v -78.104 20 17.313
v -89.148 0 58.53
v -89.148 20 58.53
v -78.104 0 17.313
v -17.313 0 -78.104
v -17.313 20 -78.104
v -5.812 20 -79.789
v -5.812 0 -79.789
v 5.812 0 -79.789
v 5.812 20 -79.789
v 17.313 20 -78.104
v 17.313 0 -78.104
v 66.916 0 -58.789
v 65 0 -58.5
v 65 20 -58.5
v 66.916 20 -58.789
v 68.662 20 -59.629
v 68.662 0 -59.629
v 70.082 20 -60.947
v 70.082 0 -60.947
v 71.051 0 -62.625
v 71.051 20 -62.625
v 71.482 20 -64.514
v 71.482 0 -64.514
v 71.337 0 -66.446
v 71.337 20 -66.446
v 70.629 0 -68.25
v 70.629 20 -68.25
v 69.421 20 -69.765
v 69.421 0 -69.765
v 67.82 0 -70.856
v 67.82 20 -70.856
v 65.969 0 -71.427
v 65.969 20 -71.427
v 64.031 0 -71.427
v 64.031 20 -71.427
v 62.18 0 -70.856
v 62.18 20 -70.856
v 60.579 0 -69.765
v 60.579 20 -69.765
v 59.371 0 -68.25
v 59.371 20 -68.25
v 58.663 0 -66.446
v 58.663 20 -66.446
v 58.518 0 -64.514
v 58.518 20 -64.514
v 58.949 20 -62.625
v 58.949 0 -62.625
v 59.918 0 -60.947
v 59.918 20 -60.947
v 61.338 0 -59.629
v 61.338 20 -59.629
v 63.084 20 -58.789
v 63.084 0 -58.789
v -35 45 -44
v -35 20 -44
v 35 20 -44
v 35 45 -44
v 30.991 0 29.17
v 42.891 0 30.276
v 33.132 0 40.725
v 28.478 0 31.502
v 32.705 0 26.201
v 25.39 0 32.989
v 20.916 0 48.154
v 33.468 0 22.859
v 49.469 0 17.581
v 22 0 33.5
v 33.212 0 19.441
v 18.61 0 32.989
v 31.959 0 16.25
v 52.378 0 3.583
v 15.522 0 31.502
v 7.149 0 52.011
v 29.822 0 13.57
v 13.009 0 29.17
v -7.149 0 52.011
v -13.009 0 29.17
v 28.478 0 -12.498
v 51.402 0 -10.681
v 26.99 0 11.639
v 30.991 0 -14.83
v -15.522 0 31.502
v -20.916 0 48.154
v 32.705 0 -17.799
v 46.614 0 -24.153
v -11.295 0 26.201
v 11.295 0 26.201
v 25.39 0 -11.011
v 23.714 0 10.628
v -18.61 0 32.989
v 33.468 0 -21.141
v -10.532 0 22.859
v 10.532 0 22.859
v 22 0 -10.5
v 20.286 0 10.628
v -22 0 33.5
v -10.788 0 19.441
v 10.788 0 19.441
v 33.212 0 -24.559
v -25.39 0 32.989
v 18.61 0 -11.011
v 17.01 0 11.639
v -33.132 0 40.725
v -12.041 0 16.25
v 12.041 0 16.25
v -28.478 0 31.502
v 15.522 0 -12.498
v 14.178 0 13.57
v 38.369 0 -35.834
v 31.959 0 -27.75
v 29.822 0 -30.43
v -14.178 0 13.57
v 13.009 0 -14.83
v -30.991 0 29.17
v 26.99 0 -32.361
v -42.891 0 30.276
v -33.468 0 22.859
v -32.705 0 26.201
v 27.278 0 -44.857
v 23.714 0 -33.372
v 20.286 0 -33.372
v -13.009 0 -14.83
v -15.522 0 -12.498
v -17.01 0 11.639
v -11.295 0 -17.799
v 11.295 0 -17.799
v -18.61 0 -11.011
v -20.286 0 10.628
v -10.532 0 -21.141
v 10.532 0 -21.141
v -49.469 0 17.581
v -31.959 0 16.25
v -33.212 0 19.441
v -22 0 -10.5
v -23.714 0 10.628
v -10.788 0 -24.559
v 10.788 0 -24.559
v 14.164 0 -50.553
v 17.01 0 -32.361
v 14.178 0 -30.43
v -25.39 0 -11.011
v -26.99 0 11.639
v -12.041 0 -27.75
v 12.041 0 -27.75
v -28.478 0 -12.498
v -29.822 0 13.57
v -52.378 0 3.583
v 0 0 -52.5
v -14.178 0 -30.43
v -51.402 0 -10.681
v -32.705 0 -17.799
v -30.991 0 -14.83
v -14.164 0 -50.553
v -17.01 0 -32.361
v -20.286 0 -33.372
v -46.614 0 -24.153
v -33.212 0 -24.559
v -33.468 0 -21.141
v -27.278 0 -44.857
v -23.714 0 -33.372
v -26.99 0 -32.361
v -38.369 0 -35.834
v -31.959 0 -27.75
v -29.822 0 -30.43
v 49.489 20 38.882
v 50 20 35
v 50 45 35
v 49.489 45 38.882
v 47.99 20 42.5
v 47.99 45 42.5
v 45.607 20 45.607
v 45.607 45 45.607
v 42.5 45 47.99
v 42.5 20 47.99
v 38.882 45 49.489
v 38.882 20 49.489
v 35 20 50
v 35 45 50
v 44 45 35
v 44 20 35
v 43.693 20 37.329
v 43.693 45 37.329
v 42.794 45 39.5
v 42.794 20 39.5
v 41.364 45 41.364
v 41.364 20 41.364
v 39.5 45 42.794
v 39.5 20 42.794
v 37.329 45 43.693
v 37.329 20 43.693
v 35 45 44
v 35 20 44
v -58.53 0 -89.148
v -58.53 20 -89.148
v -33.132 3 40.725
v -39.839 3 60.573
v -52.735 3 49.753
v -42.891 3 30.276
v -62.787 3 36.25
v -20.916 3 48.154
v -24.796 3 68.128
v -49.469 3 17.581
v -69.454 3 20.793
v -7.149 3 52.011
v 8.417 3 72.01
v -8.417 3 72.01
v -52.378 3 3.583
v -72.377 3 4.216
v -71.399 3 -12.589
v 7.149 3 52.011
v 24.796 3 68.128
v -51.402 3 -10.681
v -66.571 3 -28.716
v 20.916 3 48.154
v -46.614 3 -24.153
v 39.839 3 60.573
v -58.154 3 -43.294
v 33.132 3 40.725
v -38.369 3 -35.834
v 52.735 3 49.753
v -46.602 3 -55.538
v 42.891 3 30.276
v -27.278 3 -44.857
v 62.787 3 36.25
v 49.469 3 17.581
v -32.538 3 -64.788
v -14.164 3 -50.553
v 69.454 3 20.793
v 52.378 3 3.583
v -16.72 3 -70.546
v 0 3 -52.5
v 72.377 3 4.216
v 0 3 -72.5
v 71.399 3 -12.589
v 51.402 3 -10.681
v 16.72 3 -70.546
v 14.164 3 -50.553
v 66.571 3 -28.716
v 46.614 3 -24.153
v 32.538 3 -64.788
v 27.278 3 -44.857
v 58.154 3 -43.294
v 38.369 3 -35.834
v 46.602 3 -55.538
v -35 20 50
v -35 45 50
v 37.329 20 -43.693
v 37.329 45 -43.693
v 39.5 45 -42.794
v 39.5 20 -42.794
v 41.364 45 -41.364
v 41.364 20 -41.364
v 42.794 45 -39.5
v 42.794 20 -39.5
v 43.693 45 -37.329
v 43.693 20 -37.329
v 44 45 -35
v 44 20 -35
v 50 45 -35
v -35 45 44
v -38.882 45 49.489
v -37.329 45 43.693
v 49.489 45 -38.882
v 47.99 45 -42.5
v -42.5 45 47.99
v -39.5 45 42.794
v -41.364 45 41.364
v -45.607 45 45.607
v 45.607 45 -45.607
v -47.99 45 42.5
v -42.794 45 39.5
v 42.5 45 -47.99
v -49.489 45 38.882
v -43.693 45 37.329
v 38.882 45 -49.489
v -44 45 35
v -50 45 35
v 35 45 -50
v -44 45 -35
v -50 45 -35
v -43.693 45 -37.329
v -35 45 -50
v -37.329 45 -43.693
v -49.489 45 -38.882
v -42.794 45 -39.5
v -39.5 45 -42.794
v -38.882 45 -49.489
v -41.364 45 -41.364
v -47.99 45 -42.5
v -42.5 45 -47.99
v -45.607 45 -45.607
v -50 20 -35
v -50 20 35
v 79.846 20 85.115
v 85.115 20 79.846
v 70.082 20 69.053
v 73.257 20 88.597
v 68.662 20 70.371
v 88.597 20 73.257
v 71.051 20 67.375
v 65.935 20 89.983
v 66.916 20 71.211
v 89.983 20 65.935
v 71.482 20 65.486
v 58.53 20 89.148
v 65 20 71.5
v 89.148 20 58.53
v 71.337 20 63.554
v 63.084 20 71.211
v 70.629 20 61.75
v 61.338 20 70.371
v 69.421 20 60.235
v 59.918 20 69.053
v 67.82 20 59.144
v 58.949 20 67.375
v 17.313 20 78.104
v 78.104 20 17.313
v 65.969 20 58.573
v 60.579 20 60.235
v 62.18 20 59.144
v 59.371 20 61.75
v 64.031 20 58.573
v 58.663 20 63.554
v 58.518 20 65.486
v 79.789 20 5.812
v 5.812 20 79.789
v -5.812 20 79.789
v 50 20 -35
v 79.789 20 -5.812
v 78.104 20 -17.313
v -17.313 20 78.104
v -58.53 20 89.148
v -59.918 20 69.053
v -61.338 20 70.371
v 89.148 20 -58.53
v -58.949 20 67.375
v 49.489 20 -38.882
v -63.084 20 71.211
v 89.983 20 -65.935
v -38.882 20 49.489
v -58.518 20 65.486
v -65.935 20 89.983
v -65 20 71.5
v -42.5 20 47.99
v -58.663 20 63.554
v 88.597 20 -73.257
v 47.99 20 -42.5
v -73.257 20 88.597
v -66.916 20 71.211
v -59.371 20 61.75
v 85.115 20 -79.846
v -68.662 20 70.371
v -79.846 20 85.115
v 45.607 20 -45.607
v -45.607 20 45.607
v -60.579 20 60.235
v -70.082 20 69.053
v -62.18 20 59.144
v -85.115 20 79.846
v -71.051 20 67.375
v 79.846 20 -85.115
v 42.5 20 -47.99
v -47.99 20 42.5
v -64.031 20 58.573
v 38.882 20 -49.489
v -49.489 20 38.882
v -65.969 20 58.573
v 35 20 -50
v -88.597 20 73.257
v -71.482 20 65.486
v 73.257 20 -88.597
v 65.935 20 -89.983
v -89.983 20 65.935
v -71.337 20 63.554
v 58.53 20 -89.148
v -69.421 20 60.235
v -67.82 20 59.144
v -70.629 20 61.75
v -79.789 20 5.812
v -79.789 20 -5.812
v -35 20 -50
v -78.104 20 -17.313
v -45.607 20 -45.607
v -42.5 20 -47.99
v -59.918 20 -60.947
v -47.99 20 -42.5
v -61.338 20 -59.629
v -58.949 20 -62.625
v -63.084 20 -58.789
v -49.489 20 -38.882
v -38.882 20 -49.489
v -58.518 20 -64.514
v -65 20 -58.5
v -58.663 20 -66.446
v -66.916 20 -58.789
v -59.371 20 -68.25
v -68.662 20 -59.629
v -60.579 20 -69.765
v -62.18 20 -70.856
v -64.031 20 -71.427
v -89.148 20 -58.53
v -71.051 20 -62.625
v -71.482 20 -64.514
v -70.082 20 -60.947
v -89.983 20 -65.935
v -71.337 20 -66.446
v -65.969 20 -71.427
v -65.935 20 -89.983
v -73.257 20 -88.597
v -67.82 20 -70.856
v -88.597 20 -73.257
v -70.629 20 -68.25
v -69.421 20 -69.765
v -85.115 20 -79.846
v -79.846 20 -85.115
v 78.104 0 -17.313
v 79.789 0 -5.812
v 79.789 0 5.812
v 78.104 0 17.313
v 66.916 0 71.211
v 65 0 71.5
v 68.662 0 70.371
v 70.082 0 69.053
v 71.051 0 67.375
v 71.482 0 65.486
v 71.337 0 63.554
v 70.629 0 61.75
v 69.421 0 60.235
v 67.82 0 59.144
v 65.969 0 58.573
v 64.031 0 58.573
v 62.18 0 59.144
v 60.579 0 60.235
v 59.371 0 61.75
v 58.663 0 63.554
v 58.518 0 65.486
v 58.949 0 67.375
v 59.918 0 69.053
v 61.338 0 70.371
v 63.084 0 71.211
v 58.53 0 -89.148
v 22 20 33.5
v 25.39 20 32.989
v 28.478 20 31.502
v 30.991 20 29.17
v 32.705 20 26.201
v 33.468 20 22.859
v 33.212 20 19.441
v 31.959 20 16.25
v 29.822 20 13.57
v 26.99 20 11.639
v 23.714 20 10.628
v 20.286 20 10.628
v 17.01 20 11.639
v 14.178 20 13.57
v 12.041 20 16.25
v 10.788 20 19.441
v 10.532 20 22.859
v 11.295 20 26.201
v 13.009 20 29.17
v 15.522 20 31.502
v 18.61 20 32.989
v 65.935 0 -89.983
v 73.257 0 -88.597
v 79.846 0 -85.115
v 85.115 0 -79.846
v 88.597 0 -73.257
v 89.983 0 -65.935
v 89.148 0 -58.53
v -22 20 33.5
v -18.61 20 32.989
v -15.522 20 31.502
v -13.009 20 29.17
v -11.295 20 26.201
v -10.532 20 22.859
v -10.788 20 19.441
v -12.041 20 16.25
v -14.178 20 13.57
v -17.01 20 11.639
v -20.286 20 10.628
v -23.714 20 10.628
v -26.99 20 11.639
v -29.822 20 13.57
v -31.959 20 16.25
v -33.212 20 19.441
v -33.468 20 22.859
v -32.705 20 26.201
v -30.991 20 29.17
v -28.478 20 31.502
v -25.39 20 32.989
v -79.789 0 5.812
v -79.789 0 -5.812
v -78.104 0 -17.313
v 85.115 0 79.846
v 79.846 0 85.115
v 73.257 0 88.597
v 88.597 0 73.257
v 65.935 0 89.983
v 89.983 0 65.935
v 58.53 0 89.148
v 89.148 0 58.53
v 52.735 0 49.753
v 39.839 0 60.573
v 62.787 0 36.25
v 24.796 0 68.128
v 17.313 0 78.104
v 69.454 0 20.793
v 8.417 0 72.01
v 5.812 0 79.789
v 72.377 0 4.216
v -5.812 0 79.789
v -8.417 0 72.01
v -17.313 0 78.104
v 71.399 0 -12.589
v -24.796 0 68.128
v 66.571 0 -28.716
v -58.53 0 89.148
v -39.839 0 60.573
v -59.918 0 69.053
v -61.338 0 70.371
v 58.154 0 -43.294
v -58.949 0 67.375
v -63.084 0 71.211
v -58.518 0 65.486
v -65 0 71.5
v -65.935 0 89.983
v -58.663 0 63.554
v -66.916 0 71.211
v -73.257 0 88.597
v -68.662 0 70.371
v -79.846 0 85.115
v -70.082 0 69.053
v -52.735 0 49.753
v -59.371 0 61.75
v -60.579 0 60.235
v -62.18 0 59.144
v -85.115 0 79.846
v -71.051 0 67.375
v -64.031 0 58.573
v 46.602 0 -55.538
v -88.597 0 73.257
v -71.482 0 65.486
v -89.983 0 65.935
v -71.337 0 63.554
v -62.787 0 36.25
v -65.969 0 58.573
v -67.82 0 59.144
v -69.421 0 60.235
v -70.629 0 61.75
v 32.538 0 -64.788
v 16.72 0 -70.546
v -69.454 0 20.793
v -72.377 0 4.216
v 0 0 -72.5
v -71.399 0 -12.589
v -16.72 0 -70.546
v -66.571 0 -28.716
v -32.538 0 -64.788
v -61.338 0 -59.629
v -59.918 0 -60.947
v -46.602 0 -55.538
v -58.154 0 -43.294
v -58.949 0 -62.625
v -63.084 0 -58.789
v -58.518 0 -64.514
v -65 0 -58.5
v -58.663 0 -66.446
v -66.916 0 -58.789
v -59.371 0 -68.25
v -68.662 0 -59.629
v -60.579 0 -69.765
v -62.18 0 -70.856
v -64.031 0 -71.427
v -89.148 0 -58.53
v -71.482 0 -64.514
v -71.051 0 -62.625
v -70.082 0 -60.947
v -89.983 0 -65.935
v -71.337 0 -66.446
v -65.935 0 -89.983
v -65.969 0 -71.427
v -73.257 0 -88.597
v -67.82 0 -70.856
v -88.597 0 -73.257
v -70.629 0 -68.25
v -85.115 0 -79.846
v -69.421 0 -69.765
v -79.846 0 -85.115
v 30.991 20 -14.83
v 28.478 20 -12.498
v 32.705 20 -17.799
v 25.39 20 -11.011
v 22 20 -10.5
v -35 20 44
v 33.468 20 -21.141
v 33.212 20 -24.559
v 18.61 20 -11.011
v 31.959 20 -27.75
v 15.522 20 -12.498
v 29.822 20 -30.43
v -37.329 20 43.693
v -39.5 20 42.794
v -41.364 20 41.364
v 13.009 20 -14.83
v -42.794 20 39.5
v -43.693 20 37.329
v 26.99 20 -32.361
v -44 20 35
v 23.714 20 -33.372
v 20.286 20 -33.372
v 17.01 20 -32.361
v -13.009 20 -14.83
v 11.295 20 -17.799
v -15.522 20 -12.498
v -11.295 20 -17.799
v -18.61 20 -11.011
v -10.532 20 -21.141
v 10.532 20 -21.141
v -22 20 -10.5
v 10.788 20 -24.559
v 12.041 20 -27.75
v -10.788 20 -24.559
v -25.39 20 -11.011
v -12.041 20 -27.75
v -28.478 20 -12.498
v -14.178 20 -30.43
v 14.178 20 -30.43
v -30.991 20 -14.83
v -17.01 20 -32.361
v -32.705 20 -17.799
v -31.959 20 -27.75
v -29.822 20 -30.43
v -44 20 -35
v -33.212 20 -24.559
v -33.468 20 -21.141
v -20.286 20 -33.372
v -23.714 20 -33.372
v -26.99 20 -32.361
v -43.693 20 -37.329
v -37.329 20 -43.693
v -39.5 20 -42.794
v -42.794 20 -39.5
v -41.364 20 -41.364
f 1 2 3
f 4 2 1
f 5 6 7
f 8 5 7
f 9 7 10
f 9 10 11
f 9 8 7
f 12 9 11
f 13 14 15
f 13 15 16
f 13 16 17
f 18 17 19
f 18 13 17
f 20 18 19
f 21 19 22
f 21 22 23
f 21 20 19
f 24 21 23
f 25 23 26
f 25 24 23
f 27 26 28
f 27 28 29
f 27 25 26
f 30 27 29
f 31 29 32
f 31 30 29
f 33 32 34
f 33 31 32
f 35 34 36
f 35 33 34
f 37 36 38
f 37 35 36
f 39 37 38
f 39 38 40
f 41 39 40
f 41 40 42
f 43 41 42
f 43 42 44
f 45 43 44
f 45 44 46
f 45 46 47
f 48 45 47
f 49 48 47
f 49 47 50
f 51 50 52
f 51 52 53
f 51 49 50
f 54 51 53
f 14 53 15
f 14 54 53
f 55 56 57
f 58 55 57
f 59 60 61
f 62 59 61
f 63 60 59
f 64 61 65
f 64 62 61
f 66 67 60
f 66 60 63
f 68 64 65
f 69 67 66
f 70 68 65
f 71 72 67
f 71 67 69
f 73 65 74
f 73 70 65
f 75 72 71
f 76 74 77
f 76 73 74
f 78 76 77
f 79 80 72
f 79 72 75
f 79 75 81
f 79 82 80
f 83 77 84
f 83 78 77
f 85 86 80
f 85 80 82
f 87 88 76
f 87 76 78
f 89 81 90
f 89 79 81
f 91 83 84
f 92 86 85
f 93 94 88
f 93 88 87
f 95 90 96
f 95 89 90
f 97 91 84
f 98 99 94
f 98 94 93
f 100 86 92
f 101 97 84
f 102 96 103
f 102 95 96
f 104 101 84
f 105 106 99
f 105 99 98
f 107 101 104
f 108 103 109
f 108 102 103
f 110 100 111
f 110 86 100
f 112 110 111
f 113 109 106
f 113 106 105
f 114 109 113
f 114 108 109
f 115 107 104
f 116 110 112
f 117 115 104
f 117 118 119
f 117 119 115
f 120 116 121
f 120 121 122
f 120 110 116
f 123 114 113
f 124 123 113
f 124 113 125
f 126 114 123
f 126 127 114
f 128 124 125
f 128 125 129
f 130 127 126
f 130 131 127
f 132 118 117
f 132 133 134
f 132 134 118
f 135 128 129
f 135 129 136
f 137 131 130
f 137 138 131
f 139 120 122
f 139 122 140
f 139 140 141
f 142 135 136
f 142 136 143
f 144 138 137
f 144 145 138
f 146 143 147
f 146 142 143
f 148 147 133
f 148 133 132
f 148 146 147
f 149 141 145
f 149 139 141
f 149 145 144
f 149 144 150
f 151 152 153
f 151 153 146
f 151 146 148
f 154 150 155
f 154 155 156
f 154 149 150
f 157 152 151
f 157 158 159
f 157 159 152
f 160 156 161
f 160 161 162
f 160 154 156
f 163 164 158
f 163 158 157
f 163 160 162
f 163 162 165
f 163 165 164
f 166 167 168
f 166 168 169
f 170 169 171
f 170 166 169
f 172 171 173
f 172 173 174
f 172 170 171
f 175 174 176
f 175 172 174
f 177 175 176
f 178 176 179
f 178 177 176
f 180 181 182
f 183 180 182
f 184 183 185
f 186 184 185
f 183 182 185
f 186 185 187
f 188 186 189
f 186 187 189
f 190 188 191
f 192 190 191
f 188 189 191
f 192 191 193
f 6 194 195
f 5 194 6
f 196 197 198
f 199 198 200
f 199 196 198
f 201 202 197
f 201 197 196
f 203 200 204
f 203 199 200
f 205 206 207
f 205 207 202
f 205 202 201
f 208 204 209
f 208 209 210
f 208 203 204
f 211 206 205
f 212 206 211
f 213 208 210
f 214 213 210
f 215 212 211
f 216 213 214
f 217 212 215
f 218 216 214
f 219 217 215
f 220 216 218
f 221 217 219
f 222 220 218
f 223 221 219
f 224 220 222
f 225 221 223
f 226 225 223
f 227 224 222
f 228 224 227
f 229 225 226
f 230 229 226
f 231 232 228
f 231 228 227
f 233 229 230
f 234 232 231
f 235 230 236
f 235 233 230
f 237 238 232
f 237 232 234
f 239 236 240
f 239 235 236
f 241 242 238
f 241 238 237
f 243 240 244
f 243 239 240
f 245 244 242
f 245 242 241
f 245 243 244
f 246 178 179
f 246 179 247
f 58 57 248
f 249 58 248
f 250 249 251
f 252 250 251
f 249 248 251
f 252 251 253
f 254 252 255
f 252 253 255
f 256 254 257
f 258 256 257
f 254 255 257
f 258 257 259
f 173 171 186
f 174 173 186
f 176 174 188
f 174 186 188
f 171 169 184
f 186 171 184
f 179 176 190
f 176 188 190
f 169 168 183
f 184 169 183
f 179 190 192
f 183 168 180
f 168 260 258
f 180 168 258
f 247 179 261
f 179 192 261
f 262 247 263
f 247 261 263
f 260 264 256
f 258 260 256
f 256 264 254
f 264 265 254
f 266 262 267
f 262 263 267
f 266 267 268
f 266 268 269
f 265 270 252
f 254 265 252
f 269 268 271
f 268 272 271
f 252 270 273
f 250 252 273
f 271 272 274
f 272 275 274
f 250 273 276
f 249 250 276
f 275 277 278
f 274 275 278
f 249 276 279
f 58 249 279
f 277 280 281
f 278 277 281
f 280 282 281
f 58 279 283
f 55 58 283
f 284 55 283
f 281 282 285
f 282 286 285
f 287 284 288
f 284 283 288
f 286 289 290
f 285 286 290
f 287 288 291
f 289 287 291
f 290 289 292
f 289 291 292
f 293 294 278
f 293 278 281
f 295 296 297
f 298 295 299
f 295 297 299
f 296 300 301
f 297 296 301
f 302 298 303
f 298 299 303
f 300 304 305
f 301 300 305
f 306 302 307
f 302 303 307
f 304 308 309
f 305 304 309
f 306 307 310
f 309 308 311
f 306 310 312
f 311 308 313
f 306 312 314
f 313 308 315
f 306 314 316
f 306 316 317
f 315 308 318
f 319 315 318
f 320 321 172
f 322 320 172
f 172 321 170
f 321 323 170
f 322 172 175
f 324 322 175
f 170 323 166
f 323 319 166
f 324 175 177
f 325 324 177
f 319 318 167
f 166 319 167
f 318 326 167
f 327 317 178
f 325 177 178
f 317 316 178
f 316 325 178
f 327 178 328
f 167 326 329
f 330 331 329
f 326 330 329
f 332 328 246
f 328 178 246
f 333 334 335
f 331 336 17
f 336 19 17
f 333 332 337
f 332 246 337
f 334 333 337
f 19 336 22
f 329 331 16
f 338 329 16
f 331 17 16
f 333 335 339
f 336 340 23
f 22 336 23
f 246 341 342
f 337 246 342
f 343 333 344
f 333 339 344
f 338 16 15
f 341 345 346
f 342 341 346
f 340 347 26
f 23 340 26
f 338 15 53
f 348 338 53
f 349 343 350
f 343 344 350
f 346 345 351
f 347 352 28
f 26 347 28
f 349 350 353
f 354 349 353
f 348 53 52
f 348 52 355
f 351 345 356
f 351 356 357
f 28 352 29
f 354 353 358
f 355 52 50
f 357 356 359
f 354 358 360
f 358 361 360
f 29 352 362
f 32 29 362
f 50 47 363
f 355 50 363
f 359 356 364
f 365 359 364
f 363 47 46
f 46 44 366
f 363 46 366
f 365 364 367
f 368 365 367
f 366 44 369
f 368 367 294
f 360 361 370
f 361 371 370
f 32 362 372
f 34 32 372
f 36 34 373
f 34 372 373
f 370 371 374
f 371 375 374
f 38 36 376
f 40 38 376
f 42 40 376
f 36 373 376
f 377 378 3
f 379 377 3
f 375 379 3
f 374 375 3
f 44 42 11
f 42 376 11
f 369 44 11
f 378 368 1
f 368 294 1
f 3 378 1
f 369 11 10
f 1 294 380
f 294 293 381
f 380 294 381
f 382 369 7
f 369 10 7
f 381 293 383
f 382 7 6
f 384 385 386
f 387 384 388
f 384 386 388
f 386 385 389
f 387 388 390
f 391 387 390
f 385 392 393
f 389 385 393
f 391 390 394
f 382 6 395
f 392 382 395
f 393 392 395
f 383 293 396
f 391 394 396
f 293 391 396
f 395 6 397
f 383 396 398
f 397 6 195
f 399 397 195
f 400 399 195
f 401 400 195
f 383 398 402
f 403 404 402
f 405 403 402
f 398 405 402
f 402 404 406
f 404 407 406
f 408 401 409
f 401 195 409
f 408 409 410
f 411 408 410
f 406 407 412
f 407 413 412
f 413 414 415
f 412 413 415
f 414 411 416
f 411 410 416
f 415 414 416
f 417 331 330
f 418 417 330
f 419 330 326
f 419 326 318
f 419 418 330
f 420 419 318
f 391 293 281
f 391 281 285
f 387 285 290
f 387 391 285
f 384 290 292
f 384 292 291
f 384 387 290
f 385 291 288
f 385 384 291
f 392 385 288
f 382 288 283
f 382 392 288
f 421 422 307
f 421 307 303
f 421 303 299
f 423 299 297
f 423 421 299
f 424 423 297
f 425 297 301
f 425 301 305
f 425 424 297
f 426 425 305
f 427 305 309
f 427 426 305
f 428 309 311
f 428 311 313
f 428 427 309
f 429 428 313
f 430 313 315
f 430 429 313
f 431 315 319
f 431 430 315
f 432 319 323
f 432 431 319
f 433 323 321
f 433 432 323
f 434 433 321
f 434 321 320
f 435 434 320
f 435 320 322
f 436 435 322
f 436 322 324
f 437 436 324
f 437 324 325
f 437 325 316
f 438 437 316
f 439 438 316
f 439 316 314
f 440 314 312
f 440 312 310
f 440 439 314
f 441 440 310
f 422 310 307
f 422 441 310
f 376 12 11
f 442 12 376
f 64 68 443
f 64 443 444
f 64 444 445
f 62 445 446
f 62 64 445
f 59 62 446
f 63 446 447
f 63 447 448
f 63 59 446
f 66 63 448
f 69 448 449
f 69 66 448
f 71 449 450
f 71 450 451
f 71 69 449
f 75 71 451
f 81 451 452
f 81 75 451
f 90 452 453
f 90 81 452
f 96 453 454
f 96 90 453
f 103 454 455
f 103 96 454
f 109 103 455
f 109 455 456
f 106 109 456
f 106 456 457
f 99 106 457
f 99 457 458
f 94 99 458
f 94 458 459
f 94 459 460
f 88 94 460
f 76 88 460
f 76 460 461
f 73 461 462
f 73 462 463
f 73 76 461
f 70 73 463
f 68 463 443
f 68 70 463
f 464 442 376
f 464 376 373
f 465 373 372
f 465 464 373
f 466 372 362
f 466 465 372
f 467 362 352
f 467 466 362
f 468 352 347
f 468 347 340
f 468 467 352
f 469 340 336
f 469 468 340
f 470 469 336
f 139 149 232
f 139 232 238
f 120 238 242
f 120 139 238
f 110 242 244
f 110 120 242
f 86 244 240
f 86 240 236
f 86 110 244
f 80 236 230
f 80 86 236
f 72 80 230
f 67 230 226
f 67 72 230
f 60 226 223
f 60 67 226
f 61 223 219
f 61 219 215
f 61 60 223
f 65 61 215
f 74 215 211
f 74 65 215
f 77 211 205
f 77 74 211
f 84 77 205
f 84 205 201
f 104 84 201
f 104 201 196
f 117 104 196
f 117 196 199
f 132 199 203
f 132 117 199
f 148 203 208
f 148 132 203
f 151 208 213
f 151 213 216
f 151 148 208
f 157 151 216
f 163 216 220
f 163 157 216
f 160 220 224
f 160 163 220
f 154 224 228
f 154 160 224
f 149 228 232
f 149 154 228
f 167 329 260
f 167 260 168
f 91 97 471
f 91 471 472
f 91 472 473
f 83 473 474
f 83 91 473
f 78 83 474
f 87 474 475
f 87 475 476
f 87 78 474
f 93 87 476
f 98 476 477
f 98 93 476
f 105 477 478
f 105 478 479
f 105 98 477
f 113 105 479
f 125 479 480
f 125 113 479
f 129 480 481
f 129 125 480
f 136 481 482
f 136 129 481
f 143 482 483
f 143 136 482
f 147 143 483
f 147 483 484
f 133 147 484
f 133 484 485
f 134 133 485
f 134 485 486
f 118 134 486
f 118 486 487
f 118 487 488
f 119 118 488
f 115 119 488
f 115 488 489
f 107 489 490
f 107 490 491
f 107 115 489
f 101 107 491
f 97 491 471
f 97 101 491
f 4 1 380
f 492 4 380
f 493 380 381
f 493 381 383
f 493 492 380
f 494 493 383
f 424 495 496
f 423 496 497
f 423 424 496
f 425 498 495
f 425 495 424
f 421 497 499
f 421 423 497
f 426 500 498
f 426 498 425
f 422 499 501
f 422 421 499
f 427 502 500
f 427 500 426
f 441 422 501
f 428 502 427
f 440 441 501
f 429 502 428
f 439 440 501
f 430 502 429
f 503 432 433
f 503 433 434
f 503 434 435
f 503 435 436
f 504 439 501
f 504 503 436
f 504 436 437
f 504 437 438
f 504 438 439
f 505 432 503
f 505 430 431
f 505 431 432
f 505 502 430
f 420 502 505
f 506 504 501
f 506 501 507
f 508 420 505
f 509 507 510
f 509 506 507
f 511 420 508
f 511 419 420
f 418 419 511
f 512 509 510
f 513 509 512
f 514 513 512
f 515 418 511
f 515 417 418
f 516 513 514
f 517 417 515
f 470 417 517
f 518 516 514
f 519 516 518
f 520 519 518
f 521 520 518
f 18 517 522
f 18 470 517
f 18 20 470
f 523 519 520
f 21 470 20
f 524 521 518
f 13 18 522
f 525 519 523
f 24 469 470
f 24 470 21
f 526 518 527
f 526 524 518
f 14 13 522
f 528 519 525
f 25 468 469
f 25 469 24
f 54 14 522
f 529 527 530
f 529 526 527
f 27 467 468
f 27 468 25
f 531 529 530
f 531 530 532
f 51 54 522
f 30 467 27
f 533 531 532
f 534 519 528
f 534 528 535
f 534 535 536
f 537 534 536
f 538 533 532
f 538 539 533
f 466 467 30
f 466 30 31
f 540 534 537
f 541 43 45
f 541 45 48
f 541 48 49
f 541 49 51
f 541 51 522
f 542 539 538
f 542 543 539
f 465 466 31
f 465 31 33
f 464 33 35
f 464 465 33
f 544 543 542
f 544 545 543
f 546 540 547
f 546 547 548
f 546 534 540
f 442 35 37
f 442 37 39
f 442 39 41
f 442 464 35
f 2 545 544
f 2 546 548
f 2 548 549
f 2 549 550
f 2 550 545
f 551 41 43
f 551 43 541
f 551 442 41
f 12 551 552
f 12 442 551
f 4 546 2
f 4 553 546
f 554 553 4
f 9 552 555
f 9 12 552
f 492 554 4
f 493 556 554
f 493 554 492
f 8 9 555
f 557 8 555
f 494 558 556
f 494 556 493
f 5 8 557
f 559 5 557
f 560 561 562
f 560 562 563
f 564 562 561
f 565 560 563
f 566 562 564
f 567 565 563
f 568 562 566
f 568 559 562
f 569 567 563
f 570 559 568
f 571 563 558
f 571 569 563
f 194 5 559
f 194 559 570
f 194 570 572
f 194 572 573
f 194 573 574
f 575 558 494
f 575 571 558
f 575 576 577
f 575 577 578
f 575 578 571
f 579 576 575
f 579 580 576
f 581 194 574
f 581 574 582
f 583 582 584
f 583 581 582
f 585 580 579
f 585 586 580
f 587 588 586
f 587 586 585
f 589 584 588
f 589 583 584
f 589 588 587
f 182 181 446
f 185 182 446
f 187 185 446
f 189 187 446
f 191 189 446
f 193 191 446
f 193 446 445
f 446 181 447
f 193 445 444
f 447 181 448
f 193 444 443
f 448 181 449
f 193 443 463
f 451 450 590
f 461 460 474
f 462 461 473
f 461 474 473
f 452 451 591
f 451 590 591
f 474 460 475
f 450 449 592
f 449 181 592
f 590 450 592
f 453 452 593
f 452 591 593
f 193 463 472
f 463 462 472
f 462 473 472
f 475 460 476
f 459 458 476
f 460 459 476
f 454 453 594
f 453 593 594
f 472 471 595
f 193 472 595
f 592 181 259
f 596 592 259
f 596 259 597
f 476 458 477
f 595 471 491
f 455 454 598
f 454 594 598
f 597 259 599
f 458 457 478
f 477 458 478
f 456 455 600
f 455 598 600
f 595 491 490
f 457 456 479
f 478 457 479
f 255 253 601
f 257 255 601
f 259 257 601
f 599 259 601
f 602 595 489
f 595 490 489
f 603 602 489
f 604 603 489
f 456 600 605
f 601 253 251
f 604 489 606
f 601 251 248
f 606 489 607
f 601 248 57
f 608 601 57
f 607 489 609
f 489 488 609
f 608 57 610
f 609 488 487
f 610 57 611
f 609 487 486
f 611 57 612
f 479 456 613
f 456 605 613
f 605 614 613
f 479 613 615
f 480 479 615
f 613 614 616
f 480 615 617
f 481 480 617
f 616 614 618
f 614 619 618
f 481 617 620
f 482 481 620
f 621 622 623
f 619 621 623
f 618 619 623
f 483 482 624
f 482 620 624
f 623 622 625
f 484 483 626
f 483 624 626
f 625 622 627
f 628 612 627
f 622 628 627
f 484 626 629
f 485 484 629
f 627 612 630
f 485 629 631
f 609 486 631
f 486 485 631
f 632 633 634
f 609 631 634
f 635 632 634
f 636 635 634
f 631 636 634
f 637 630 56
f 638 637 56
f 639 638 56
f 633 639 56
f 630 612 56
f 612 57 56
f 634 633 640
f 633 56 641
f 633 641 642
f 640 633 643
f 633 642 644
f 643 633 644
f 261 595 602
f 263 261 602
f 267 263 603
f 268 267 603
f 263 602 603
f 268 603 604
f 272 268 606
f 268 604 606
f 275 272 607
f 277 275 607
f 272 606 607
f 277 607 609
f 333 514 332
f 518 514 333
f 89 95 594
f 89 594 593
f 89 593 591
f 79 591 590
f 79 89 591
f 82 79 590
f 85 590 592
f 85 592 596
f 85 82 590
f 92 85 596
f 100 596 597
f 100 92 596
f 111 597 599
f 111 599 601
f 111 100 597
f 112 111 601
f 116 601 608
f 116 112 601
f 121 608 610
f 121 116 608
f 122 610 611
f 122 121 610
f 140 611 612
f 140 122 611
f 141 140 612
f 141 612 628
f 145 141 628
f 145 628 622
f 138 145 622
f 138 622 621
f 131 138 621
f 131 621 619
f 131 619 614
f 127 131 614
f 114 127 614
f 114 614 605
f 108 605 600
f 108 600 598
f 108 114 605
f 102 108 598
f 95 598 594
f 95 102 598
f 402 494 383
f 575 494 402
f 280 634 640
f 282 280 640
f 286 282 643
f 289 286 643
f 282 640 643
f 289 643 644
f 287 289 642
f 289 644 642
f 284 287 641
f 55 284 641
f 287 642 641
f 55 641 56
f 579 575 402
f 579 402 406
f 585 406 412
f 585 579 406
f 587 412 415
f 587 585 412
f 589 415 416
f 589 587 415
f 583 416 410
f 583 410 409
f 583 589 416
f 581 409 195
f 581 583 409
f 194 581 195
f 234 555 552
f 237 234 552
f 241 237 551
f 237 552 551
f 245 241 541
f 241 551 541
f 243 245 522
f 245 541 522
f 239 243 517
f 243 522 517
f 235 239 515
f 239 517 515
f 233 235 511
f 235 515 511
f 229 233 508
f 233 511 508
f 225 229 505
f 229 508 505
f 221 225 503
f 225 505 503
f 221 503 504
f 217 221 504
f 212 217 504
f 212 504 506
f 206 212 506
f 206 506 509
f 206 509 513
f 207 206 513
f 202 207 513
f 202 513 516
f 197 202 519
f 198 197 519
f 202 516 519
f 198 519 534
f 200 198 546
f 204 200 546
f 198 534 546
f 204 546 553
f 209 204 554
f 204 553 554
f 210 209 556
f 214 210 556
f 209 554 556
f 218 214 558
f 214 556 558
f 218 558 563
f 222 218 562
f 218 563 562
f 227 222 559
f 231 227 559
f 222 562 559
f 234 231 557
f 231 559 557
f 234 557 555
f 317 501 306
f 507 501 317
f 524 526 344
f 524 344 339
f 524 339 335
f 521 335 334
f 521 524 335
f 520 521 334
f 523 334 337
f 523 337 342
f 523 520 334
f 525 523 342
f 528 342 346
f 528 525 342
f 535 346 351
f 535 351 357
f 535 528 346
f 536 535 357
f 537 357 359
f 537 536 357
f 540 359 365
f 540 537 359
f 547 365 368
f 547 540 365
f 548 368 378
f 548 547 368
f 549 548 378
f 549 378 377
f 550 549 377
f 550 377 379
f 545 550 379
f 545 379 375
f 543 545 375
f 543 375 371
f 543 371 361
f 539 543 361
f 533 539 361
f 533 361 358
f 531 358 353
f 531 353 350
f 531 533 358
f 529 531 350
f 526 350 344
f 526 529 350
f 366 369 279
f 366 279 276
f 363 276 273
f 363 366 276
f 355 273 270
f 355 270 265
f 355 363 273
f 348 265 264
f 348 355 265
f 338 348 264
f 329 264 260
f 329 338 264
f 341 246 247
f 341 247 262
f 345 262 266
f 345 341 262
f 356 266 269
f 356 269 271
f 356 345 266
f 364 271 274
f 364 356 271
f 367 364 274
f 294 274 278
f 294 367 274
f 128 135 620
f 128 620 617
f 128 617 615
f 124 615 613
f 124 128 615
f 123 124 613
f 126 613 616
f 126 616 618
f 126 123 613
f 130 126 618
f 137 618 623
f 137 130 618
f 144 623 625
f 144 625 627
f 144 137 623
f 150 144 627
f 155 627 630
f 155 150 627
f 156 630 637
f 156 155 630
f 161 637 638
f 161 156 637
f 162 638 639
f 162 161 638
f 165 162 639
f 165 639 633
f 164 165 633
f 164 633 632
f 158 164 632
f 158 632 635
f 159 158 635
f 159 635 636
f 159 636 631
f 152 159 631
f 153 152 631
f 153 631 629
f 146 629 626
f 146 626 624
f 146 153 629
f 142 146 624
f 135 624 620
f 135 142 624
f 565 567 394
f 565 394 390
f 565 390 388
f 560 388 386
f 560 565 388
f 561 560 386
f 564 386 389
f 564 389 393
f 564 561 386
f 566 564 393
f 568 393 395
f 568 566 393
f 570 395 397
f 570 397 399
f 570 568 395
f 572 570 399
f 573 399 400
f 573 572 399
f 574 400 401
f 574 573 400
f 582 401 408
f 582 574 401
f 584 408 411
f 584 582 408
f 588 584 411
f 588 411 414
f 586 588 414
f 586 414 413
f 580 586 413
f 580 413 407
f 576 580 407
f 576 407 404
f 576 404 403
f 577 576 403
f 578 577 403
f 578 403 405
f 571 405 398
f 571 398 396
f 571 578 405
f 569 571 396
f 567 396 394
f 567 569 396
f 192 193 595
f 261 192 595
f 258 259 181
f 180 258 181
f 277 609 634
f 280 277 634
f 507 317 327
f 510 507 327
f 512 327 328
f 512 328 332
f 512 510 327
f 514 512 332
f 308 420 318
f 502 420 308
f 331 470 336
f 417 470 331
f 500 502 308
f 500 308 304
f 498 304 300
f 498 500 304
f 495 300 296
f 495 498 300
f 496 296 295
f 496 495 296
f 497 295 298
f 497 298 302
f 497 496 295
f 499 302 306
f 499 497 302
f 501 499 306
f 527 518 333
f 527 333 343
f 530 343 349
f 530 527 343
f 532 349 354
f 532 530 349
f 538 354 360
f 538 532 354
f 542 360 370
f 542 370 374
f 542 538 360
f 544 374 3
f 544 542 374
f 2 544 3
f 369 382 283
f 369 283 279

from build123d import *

# Parameters (mm, degrees)
SKETCH1_R             = 6.5
BOSS_EXTRUDE1_DEPTH   = 20
SKETCH1_R_2           = 11.5
BOSS_EXTRUDE1_2_DEPTH = 20
BOSS_EXTRUDE2_DEPTH   = 45
SKETCH2_R             = 72.5
SKETCH2_R_2           = 52.5
CUT_EXTRUDE1_DEPTH    = 3


with BuildPart() as part:
    # Sketch1 → Boss-Extrude1 (new body)
    with BuildSketch(Plane(origin=(0, 0, 0), x_dir=(1, 0, 0), z_dir=(0, 1, 0))):
        with BuildLine():
            Line((58.529523872, 89.148145657), (17.312897978, 78.104184034))
            ThreePointArc((17.312897978, 78.104184034), (0, 80), (-17.312897978, 78.104184034))
            Line((-17.312897978, 78.104184034), (-58.529523872, 89.148145657))
            ThreePointArc((-58.529523872, 89.148145657), (-82.67766953, 82.67766953), (-89.148145657, 58.529523872))
            Line((-89.148145657, 58.529523872), (-78.104184034, 17.312897978))
            ThreePointArc((-78.104184034, 17.312897978), (-80, 0), (-78.104184034, -17.312897978))
            Line((-78.104184034, -17.312897978), (-89.148145657, -58.529523872))
            ThreePointArc((-89.148145657, -58.529523872), (-82.67766953, -82.67766953), (-58.529523872, -89.148145657))
            Line((-58.529523872, -89.148145657), (-17.312897978, -78.104184034))
            ThreePointArc((-17.312897978, -78.104184034), (0, -80), (17.312897978, -78.104184034))
            Line((17.312897978, -78.104184034), (58.529523872, -89.148145657))
            ThreePointArc((58.529523872, -89.148145657), (82.67766953, -82.67766953), (89.148145657, -58.529523872))
            Line((89.148145657, -58.529523872), (78.104184034, -17.312897978))
            ThreePointArc((78.104184034, -17.312897978), (80, 0), (78.104184034, 17.312897978))
            Line((78.104184034, 17.312897978), (89.148145657, 58.529523872))
            ThreePointArc((89.148145657, 58.529523872), (82.67766953, 82.67766953), (58.529523872, 89.148145657))
        make_face()
        with Locations((-65, -65)):
            Circle(SKETCH1_R, mode=Mode.SUBTRACT)
        with Locations((65, -65)):
            Circle(SKETCH1_R, mode=Mode.SUBTRACT)
        with Locations((-65, 65)):
            Circle(SKETCH1_R, mode=Mode.SUBTRACT)
        with BuildLine():
            Line((35, -50), (-35, -50))
            ThreePointArc((-35, -50), (-45.606601718, -45.606601718), (-50, -35))
            Line((-50, -35), (-50, 35))
            ThreePointArc((-50, 35), (-45.606601718, 45.606601718), (-35, 50))
            Line((-35, 50), (35, 50))
            ThreePointArc((35, 50), (45.606601718, 45.606601718), (50, 35))
            Line((50, 35), (50, -35))
            ThreePointArc((50, -35), (45.606601718, -45.606601718), (35, -50))
        make_face(mode=Mode.SUBTRACT)
        with Locations((65, 65)):
            Circle(SKETCH1_R, mode=Mode.SUBTRACT)
    extrude(amount=BOSS_EXTRUDE1_DEPTH)



with BuildPart() as body_2:
    # Sketch1 → Boss-Extrude1 2 (new body)
    with BuildSketch(Plane(origin=(0, 0, 0), x_dir=(1, 0, 0), z_dir=(0, 1, 0))):
        with BuildLine():
            Line((35, 44), (-35, 44))
            ThreePointArc((-35, 44), (-41.363961031, 41.363961031), (-44, 35))
            Line((-44, 35), (-44, -35))
            ThreePointArc((-44, -35), (-41.363961031, -41.363961031), (-35, -44))
            Line((-35, -44), (35, -44))
            ThreePointArc((35, -44), (41.363961031, -41.363961031), (44, -35))
            Line((44, -35), (44, 35))
            ThreePointArc((44, 35), (41.363961031, 41.363961031), (35, 44))
        make_face()
        with Locations((-22, -22)):
            Circle(SKETCH1_R_2, mode=Mode.SUBTRACT)
        with Locations((22, -22)):
            Circle(SKETCH1_R_2, mode=Mode.SUBTRACT)
        with Locations((-22, 22)):
            Circle(SKETCH1_R_2, mode=Mode.SUBTRACT)
        with Locations((22, 22)):
            Circle(SKETCH1_R_2, mode=Mode.SUBTRACT)
    extrude(amount=BOSS_EXTRUDE1_2_DEPTH)


with BuildPart() as part_1:
    add(part.part)

    add(body_2.part)  # Boss-Extrude2 merges body 2
    # Sketch1<3> → Boss-Extrude2 (add)
    with BuildSketch(Plane(origin=(0, 0, 0), x_dir=(1, 0, 0), z_dir=(0, 1, 0))):
        with BuildLine():
            ThreePointArc((-50, -35), (-45.606601718, -45.606601718), (-35, -50))
            Line((-35, -50), (35, -50))
            ThreePointArc((35, -50), (45.606601718, -45.606601718), (50, -35))
            Line((50, -35), (50, 35))
            ThreePointArc((50, 35), (45.606601718, 45.606601718), (35, 50))
            Line((35, 50), (-35, 50))
            ThreePointArc((-35, 50), (-45.606601718, 45.606601718), (-50, 35))
            Line((-50, 35), (-50, -35))
        make_face()
        with BuildLine():
            ThreePointArc((-44, 35), (-41.363961031, 41.363961031), (-35, 44))
            Line((-35, 44), (35, 44))
            ThreePointArc((35, 44), (41.363961031, 41.363961031), (44, 35))
            Line((44, 35), (44, -35))
            ThreePointArc((44, -35), (41.363961031, -41.363961031), (35, -44))
            Line((35, -44), (-35, -44))
            ThreePointArc((-35, -44), (-41.363961031, -41.363961031), (-44, -35))
            Line((-44, -35), (-44, 35))
        make_face(mode=Mode.SUBTRACT)
    extrude(amount=BOSS_EXTRUDE2_DEPTH)

    # Sketch2 → Cut-Extrude1 (cut)
    with BuildSketch(Plane.XZ):
        Circle(SKETCH2_R)
        Circle(SKETCH2_R_2, mode=Mode.SUBTRACT)
    extrude(amount=-CUT_EXTRUDE1_DEPTH, mode=Mode.SUBTRACT)


solid = part_1.part
